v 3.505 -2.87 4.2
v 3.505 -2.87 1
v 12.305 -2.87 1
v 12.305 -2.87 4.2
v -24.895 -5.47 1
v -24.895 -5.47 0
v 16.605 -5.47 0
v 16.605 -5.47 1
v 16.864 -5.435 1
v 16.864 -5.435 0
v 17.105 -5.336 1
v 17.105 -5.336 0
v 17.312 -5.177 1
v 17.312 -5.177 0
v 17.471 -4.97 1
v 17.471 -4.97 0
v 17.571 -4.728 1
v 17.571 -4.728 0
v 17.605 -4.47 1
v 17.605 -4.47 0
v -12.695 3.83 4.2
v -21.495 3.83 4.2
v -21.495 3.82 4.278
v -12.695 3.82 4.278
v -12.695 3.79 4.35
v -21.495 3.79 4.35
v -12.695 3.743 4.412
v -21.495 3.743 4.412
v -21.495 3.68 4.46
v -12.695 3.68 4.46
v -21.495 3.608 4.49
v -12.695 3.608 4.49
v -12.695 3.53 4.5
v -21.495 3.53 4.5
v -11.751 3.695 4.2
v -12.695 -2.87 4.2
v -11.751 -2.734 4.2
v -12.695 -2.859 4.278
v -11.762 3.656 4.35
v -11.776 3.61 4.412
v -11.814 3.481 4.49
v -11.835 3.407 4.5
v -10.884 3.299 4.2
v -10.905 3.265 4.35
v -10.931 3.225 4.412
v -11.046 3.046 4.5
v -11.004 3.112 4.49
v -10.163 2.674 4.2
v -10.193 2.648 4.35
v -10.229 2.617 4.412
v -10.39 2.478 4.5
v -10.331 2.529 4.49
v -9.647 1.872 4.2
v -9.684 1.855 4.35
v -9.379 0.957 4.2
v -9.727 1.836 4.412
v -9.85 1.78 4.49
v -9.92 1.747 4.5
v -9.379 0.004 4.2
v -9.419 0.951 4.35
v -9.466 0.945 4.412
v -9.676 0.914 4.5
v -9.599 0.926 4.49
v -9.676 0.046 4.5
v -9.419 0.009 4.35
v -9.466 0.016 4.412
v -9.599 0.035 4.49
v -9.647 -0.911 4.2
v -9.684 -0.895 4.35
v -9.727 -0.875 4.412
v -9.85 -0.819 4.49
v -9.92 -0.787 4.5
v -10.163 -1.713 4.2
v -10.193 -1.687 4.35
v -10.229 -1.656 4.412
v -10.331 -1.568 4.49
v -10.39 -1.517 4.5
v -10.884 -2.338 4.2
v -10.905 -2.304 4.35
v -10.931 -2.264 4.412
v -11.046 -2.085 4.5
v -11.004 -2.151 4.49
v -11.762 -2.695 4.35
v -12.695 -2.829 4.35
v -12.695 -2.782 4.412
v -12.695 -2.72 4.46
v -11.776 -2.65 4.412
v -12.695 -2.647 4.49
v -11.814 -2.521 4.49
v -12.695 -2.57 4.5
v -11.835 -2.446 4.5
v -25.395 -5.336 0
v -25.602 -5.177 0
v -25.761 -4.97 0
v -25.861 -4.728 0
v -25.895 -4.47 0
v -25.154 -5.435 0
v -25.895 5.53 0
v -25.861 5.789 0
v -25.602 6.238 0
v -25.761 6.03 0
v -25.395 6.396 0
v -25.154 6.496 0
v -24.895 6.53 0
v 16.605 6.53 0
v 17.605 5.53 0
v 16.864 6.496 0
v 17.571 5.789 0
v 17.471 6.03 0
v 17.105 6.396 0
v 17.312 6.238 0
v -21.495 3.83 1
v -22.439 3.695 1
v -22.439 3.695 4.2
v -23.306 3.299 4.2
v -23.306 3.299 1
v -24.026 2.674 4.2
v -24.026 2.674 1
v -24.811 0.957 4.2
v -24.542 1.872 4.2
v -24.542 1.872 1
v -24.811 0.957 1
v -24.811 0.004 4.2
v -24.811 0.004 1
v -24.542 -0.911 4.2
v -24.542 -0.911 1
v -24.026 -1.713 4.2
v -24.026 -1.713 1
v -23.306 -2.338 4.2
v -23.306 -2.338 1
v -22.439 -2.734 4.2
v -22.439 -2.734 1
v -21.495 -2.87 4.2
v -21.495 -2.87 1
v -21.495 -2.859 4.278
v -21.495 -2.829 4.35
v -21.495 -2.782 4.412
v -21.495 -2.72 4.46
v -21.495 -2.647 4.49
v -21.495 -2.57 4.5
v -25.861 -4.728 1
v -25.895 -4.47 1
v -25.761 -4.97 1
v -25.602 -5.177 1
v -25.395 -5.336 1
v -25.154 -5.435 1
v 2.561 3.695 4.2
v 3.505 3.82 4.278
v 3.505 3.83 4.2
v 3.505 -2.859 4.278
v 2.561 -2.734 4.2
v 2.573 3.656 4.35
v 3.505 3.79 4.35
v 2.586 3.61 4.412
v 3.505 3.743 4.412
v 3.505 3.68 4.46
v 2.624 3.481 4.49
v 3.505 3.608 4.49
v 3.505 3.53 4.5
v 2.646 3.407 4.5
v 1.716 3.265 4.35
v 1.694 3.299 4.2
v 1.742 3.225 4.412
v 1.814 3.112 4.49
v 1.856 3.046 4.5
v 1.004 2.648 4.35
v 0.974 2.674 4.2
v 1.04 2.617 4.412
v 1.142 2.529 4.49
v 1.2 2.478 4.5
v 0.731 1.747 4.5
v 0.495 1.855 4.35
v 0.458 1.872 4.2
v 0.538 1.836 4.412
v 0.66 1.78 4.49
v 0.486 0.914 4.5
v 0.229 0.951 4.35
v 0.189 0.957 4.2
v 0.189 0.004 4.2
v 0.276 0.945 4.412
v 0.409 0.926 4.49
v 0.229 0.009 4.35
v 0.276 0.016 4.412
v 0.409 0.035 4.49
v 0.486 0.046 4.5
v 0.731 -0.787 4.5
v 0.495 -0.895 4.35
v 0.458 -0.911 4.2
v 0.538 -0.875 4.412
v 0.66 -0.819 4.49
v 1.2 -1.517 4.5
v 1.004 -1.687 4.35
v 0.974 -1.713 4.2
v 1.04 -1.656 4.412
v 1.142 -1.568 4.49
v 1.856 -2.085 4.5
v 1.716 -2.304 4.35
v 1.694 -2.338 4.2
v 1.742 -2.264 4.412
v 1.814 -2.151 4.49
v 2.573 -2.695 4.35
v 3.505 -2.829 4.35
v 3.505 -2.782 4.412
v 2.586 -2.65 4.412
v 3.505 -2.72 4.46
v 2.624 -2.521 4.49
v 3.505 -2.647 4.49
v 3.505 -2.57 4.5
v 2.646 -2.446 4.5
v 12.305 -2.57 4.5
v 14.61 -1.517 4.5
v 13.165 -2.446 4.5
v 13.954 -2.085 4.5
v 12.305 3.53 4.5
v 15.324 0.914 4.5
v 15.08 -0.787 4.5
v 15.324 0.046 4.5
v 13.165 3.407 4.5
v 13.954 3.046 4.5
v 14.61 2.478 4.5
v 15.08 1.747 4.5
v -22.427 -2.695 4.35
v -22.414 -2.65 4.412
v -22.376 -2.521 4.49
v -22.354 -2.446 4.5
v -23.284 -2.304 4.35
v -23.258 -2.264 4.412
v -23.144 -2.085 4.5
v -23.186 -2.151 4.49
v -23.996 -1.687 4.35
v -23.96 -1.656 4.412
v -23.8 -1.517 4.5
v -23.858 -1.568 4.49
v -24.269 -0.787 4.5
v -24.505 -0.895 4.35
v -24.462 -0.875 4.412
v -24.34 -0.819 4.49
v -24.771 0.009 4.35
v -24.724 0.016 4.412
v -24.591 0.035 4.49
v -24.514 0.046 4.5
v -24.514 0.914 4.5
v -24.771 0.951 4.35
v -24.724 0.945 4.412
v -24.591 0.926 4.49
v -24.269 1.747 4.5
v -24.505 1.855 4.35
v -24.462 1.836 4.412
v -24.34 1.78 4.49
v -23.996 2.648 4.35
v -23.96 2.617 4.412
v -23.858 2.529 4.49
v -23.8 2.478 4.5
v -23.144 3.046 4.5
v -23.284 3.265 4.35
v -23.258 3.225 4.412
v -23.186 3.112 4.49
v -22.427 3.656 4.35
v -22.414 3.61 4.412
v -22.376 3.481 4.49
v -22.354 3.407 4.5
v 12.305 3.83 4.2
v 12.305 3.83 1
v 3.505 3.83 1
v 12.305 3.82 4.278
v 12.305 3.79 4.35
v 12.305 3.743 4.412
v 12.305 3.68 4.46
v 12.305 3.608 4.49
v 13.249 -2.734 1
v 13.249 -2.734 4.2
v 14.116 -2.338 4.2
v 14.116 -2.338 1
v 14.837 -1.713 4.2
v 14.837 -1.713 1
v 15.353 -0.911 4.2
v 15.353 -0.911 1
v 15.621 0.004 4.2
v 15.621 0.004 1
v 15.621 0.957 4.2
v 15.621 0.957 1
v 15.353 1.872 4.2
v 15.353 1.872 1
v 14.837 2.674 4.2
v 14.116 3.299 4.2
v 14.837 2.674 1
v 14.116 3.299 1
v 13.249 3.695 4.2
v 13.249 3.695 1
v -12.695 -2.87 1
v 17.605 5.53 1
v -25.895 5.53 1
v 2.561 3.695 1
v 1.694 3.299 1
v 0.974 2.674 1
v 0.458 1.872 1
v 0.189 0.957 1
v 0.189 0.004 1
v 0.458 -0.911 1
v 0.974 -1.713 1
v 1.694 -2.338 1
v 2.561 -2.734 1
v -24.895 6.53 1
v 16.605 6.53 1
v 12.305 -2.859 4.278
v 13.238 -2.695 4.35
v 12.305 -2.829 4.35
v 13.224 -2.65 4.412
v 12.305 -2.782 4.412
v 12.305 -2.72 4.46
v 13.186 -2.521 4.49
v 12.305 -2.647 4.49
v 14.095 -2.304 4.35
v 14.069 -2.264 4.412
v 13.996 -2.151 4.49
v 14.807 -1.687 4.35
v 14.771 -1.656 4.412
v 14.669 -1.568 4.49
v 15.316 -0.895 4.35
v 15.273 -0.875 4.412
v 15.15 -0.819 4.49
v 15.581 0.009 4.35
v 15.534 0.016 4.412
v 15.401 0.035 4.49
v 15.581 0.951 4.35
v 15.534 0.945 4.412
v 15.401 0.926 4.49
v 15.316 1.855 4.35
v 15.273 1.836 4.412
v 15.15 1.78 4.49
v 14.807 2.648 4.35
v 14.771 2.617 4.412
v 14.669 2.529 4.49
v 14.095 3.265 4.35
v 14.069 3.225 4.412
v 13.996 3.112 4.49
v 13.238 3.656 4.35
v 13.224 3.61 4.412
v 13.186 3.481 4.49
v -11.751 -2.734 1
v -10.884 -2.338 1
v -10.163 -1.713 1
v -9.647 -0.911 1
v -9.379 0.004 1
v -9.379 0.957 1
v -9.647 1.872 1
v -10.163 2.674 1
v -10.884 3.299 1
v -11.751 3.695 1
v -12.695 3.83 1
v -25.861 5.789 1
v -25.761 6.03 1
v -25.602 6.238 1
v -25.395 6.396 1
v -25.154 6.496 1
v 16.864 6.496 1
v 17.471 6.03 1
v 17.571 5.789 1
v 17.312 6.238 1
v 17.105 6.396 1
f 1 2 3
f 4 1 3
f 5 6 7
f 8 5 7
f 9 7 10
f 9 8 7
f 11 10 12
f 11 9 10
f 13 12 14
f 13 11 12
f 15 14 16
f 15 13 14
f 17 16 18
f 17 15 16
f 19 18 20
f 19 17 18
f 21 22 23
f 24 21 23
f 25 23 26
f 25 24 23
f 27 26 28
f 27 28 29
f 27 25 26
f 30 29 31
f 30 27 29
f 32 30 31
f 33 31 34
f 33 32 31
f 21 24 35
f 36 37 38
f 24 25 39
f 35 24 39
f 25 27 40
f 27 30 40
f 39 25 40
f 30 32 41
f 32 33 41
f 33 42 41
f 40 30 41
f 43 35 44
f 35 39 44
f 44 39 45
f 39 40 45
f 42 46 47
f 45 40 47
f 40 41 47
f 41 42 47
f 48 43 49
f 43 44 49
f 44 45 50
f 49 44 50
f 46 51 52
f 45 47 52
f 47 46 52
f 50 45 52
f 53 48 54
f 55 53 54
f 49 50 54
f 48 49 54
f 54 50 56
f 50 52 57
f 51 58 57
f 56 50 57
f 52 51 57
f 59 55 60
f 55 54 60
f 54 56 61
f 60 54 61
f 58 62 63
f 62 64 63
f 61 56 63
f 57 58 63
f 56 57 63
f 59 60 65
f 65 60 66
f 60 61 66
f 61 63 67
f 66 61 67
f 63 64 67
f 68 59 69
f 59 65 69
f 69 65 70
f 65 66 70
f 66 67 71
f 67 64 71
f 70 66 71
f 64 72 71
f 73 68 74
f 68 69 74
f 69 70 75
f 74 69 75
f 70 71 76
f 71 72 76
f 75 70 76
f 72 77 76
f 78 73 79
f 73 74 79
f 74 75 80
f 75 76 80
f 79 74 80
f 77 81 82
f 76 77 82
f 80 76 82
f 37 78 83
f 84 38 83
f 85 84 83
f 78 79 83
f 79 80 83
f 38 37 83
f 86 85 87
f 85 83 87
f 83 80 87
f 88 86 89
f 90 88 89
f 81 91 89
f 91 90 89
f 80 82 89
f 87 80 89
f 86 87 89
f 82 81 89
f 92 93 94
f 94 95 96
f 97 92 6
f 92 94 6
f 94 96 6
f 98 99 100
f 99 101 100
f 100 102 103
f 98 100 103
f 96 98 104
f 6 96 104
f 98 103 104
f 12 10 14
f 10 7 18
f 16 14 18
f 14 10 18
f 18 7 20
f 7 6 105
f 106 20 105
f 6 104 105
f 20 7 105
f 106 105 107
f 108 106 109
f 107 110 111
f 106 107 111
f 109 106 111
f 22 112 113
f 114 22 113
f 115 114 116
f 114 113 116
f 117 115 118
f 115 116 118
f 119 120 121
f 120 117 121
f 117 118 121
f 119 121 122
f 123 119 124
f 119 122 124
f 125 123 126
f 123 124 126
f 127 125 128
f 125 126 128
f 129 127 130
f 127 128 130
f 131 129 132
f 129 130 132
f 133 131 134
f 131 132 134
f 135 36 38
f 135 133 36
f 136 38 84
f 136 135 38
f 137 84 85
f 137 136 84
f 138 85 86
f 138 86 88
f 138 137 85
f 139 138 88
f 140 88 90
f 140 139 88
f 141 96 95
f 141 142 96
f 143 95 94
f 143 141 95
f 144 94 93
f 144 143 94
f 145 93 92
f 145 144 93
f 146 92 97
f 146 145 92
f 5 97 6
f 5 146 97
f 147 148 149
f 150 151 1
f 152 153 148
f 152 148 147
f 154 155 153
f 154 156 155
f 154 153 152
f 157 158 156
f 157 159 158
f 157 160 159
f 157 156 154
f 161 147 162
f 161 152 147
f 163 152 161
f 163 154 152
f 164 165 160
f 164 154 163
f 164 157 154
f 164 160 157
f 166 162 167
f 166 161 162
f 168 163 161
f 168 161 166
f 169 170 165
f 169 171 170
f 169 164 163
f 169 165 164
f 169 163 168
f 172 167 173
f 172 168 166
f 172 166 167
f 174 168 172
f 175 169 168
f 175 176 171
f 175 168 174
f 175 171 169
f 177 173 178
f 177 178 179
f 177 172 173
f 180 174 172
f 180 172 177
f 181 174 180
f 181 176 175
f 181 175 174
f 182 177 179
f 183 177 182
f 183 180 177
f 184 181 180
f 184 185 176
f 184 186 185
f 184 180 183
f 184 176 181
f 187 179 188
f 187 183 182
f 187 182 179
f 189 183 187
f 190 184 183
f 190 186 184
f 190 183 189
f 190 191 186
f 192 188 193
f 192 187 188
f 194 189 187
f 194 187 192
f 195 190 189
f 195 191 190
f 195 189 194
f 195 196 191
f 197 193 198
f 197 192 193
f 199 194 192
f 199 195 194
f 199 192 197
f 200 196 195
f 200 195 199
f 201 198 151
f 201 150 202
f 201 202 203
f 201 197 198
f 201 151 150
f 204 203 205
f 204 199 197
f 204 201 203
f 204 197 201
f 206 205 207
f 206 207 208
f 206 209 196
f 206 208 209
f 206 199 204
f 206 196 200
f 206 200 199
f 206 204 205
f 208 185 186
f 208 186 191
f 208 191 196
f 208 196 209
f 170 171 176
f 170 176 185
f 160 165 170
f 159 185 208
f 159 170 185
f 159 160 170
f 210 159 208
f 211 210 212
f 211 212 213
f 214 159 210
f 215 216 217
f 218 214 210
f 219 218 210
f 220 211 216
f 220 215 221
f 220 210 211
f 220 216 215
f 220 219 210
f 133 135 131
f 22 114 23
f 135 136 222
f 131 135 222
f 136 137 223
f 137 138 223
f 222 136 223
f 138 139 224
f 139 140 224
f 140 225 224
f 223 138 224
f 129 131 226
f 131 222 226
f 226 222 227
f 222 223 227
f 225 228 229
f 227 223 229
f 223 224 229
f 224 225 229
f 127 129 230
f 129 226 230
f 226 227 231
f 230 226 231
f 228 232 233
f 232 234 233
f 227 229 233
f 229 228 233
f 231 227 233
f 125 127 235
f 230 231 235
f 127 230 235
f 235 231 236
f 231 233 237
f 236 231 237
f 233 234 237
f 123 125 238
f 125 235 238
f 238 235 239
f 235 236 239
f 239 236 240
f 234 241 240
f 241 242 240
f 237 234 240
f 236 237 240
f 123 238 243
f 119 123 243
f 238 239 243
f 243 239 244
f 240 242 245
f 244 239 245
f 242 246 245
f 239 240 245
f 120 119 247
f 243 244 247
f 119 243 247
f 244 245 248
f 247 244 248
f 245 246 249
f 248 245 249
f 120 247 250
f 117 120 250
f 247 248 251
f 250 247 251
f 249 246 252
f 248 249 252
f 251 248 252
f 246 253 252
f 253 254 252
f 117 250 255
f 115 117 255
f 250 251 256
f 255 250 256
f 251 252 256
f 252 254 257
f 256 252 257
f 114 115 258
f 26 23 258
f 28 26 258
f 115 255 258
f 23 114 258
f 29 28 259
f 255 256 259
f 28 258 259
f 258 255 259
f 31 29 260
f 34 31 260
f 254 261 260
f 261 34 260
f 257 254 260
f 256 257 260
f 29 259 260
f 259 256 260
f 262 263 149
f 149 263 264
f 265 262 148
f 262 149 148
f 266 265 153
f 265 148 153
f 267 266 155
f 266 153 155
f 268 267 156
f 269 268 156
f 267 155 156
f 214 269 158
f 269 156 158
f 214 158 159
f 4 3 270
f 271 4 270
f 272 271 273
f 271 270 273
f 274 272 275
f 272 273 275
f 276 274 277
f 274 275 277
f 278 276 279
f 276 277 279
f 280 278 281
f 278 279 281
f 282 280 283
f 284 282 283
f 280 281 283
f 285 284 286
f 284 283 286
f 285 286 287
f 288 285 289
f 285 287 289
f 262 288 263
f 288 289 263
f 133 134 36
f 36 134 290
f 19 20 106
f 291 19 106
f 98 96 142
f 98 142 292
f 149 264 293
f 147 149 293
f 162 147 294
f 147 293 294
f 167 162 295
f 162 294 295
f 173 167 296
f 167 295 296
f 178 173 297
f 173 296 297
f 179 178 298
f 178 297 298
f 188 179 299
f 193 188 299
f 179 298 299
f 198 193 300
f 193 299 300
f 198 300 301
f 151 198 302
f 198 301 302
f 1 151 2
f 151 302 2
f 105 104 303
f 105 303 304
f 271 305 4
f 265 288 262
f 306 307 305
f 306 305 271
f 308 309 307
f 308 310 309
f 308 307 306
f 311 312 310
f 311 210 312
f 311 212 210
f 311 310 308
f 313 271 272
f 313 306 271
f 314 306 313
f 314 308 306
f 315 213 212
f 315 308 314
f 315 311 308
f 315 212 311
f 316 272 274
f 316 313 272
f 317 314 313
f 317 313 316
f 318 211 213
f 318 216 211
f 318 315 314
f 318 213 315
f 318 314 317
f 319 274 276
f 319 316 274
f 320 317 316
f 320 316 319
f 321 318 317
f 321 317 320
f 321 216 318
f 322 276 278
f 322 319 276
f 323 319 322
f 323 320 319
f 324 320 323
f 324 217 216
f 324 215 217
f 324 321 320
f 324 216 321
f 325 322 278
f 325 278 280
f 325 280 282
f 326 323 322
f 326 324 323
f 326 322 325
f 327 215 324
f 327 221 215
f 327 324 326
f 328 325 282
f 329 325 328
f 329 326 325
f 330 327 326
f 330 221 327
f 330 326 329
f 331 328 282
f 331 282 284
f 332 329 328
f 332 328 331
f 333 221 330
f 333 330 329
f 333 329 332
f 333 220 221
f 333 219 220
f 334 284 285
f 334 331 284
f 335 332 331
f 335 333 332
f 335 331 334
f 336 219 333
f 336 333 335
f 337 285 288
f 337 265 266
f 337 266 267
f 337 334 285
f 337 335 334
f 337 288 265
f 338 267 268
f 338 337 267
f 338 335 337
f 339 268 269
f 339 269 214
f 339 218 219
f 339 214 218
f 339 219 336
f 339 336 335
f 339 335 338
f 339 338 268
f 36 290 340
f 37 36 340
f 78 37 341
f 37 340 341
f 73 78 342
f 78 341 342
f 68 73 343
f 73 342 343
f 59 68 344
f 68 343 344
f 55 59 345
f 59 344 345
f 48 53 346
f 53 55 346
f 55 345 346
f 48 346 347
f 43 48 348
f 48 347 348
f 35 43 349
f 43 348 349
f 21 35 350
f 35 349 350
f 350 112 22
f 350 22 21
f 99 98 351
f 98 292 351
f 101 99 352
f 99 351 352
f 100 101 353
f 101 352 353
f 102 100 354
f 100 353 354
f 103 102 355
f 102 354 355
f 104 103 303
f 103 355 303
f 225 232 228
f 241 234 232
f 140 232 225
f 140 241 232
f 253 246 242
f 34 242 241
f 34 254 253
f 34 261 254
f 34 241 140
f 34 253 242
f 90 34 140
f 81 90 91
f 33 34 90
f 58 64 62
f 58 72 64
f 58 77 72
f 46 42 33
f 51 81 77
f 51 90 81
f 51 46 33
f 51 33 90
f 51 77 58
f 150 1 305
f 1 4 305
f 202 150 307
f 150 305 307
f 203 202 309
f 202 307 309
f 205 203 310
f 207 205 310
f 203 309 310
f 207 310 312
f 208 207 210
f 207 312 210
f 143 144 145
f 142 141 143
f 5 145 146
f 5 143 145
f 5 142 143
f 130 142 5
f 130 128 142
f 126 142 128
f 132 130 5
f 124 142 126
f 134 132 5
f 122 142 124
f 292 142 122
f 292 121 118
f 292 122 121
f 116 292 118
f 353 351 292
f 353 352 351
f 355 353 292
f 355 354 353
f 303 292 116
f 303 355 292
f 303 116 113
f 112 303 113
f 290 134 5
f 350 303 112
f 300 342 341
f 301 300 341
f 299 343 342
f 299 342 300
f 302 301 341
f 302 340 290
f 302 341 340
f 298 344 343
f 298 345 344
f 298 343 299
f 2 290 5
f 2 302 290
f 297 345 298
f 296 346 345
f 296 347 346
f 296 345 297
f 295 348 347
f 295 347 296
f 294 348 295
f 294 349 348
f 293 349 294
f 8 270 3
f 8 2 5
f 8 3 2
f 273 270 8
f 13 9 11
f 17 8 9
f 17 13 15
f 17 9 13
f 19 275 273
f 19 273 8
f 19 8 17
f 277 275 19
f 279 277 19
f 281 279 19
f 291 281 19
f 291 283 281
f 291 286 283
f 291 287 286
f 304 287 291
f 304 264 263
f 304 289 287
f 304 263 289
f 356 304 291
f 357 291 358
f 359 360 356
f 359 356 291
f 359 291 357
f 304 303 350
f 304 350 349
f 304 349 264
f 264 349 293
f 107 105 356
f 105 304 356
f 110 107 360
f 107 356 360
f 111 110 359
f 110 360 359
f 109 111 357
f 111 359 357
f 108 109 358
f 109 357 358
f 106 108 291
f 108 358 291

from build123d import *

# Parameters (mm, degrees)
F0_W     = 43.5
F0_H     = 12
F1_DEPTH = 1
F2_W     = 8.8
F2_H     = 6.7
F3_DEPTH = 3.5
F4_R     = 1
F5_R     = 0.3


with BuildPart() as f1:
    # F0 (on Top) → F1 (new body)
    with BuildSketch(Plane.XY):
        with Locations((-4.144736, 0.530427)):
            Rectangle(F0_W, F0_H)
    extrude(amount=F1_DEPTH)

    # F2 (on face) → F3 (join)
    with BuildSketch(Plane.XY.offset(1)):
        with Locations((-17.094736, 0.480427)):
            Rectangle(F2_W, F2_H)
        with BuildLine():
            Line((-21.494736, -2.869573), (-21.494736, 3.830427))
            ThreePointArc((-21.494736, 3.830427), (-24.844736, 0.480427), (-21.494736, -2.869573))
        make_face()
        with BuildLine():
            ThreePointArc((-12.694736, -2.869573), (-9.344736, 0.480427), (-12.694736, 3.830427))
            Line((-12.694736, 3.830427), (-12.694736, -2.869573))
        make_face()
        with BuildLine():
            Line((12.305264, 3.830427), (3.505264, 3.830427))
            ThreePointArc((3.505264, 3.830427), (0.155264, 0.480427), (3.505264, -2.869573))
            Line((3.505264, -2.869573), (12.305264, -2.869573))
            ThreePointArc((12.305264, -2.869573), (15.655264, 0.480427), (12.305264, 3.830427))
        make_face()
    extrude(amount=F3_DEPTH)

    # F4
    f4_edges = [f1.edges().sort_by_distance(p)[0] for p in [
        (-25.894736, -5.469573, 0.5),
        (17.605264, 6.530427, 0.5),
        (17.605264, -5.469573, 0.5),
        (-25.894736, 6.530427, 0.5),
    ]]
    fillet(f4_edges, radius=F4_R)

    # F5
    f5_edges = [f1.edges().sort_by_distance(p)[0] for p in [
        (-17.094736, 3.830427, 4.5),
        (7.905264, 3.830427, 4.5),
    ]]
    fillet(f5_edges, radius=F5_R)


solid = f1.part
